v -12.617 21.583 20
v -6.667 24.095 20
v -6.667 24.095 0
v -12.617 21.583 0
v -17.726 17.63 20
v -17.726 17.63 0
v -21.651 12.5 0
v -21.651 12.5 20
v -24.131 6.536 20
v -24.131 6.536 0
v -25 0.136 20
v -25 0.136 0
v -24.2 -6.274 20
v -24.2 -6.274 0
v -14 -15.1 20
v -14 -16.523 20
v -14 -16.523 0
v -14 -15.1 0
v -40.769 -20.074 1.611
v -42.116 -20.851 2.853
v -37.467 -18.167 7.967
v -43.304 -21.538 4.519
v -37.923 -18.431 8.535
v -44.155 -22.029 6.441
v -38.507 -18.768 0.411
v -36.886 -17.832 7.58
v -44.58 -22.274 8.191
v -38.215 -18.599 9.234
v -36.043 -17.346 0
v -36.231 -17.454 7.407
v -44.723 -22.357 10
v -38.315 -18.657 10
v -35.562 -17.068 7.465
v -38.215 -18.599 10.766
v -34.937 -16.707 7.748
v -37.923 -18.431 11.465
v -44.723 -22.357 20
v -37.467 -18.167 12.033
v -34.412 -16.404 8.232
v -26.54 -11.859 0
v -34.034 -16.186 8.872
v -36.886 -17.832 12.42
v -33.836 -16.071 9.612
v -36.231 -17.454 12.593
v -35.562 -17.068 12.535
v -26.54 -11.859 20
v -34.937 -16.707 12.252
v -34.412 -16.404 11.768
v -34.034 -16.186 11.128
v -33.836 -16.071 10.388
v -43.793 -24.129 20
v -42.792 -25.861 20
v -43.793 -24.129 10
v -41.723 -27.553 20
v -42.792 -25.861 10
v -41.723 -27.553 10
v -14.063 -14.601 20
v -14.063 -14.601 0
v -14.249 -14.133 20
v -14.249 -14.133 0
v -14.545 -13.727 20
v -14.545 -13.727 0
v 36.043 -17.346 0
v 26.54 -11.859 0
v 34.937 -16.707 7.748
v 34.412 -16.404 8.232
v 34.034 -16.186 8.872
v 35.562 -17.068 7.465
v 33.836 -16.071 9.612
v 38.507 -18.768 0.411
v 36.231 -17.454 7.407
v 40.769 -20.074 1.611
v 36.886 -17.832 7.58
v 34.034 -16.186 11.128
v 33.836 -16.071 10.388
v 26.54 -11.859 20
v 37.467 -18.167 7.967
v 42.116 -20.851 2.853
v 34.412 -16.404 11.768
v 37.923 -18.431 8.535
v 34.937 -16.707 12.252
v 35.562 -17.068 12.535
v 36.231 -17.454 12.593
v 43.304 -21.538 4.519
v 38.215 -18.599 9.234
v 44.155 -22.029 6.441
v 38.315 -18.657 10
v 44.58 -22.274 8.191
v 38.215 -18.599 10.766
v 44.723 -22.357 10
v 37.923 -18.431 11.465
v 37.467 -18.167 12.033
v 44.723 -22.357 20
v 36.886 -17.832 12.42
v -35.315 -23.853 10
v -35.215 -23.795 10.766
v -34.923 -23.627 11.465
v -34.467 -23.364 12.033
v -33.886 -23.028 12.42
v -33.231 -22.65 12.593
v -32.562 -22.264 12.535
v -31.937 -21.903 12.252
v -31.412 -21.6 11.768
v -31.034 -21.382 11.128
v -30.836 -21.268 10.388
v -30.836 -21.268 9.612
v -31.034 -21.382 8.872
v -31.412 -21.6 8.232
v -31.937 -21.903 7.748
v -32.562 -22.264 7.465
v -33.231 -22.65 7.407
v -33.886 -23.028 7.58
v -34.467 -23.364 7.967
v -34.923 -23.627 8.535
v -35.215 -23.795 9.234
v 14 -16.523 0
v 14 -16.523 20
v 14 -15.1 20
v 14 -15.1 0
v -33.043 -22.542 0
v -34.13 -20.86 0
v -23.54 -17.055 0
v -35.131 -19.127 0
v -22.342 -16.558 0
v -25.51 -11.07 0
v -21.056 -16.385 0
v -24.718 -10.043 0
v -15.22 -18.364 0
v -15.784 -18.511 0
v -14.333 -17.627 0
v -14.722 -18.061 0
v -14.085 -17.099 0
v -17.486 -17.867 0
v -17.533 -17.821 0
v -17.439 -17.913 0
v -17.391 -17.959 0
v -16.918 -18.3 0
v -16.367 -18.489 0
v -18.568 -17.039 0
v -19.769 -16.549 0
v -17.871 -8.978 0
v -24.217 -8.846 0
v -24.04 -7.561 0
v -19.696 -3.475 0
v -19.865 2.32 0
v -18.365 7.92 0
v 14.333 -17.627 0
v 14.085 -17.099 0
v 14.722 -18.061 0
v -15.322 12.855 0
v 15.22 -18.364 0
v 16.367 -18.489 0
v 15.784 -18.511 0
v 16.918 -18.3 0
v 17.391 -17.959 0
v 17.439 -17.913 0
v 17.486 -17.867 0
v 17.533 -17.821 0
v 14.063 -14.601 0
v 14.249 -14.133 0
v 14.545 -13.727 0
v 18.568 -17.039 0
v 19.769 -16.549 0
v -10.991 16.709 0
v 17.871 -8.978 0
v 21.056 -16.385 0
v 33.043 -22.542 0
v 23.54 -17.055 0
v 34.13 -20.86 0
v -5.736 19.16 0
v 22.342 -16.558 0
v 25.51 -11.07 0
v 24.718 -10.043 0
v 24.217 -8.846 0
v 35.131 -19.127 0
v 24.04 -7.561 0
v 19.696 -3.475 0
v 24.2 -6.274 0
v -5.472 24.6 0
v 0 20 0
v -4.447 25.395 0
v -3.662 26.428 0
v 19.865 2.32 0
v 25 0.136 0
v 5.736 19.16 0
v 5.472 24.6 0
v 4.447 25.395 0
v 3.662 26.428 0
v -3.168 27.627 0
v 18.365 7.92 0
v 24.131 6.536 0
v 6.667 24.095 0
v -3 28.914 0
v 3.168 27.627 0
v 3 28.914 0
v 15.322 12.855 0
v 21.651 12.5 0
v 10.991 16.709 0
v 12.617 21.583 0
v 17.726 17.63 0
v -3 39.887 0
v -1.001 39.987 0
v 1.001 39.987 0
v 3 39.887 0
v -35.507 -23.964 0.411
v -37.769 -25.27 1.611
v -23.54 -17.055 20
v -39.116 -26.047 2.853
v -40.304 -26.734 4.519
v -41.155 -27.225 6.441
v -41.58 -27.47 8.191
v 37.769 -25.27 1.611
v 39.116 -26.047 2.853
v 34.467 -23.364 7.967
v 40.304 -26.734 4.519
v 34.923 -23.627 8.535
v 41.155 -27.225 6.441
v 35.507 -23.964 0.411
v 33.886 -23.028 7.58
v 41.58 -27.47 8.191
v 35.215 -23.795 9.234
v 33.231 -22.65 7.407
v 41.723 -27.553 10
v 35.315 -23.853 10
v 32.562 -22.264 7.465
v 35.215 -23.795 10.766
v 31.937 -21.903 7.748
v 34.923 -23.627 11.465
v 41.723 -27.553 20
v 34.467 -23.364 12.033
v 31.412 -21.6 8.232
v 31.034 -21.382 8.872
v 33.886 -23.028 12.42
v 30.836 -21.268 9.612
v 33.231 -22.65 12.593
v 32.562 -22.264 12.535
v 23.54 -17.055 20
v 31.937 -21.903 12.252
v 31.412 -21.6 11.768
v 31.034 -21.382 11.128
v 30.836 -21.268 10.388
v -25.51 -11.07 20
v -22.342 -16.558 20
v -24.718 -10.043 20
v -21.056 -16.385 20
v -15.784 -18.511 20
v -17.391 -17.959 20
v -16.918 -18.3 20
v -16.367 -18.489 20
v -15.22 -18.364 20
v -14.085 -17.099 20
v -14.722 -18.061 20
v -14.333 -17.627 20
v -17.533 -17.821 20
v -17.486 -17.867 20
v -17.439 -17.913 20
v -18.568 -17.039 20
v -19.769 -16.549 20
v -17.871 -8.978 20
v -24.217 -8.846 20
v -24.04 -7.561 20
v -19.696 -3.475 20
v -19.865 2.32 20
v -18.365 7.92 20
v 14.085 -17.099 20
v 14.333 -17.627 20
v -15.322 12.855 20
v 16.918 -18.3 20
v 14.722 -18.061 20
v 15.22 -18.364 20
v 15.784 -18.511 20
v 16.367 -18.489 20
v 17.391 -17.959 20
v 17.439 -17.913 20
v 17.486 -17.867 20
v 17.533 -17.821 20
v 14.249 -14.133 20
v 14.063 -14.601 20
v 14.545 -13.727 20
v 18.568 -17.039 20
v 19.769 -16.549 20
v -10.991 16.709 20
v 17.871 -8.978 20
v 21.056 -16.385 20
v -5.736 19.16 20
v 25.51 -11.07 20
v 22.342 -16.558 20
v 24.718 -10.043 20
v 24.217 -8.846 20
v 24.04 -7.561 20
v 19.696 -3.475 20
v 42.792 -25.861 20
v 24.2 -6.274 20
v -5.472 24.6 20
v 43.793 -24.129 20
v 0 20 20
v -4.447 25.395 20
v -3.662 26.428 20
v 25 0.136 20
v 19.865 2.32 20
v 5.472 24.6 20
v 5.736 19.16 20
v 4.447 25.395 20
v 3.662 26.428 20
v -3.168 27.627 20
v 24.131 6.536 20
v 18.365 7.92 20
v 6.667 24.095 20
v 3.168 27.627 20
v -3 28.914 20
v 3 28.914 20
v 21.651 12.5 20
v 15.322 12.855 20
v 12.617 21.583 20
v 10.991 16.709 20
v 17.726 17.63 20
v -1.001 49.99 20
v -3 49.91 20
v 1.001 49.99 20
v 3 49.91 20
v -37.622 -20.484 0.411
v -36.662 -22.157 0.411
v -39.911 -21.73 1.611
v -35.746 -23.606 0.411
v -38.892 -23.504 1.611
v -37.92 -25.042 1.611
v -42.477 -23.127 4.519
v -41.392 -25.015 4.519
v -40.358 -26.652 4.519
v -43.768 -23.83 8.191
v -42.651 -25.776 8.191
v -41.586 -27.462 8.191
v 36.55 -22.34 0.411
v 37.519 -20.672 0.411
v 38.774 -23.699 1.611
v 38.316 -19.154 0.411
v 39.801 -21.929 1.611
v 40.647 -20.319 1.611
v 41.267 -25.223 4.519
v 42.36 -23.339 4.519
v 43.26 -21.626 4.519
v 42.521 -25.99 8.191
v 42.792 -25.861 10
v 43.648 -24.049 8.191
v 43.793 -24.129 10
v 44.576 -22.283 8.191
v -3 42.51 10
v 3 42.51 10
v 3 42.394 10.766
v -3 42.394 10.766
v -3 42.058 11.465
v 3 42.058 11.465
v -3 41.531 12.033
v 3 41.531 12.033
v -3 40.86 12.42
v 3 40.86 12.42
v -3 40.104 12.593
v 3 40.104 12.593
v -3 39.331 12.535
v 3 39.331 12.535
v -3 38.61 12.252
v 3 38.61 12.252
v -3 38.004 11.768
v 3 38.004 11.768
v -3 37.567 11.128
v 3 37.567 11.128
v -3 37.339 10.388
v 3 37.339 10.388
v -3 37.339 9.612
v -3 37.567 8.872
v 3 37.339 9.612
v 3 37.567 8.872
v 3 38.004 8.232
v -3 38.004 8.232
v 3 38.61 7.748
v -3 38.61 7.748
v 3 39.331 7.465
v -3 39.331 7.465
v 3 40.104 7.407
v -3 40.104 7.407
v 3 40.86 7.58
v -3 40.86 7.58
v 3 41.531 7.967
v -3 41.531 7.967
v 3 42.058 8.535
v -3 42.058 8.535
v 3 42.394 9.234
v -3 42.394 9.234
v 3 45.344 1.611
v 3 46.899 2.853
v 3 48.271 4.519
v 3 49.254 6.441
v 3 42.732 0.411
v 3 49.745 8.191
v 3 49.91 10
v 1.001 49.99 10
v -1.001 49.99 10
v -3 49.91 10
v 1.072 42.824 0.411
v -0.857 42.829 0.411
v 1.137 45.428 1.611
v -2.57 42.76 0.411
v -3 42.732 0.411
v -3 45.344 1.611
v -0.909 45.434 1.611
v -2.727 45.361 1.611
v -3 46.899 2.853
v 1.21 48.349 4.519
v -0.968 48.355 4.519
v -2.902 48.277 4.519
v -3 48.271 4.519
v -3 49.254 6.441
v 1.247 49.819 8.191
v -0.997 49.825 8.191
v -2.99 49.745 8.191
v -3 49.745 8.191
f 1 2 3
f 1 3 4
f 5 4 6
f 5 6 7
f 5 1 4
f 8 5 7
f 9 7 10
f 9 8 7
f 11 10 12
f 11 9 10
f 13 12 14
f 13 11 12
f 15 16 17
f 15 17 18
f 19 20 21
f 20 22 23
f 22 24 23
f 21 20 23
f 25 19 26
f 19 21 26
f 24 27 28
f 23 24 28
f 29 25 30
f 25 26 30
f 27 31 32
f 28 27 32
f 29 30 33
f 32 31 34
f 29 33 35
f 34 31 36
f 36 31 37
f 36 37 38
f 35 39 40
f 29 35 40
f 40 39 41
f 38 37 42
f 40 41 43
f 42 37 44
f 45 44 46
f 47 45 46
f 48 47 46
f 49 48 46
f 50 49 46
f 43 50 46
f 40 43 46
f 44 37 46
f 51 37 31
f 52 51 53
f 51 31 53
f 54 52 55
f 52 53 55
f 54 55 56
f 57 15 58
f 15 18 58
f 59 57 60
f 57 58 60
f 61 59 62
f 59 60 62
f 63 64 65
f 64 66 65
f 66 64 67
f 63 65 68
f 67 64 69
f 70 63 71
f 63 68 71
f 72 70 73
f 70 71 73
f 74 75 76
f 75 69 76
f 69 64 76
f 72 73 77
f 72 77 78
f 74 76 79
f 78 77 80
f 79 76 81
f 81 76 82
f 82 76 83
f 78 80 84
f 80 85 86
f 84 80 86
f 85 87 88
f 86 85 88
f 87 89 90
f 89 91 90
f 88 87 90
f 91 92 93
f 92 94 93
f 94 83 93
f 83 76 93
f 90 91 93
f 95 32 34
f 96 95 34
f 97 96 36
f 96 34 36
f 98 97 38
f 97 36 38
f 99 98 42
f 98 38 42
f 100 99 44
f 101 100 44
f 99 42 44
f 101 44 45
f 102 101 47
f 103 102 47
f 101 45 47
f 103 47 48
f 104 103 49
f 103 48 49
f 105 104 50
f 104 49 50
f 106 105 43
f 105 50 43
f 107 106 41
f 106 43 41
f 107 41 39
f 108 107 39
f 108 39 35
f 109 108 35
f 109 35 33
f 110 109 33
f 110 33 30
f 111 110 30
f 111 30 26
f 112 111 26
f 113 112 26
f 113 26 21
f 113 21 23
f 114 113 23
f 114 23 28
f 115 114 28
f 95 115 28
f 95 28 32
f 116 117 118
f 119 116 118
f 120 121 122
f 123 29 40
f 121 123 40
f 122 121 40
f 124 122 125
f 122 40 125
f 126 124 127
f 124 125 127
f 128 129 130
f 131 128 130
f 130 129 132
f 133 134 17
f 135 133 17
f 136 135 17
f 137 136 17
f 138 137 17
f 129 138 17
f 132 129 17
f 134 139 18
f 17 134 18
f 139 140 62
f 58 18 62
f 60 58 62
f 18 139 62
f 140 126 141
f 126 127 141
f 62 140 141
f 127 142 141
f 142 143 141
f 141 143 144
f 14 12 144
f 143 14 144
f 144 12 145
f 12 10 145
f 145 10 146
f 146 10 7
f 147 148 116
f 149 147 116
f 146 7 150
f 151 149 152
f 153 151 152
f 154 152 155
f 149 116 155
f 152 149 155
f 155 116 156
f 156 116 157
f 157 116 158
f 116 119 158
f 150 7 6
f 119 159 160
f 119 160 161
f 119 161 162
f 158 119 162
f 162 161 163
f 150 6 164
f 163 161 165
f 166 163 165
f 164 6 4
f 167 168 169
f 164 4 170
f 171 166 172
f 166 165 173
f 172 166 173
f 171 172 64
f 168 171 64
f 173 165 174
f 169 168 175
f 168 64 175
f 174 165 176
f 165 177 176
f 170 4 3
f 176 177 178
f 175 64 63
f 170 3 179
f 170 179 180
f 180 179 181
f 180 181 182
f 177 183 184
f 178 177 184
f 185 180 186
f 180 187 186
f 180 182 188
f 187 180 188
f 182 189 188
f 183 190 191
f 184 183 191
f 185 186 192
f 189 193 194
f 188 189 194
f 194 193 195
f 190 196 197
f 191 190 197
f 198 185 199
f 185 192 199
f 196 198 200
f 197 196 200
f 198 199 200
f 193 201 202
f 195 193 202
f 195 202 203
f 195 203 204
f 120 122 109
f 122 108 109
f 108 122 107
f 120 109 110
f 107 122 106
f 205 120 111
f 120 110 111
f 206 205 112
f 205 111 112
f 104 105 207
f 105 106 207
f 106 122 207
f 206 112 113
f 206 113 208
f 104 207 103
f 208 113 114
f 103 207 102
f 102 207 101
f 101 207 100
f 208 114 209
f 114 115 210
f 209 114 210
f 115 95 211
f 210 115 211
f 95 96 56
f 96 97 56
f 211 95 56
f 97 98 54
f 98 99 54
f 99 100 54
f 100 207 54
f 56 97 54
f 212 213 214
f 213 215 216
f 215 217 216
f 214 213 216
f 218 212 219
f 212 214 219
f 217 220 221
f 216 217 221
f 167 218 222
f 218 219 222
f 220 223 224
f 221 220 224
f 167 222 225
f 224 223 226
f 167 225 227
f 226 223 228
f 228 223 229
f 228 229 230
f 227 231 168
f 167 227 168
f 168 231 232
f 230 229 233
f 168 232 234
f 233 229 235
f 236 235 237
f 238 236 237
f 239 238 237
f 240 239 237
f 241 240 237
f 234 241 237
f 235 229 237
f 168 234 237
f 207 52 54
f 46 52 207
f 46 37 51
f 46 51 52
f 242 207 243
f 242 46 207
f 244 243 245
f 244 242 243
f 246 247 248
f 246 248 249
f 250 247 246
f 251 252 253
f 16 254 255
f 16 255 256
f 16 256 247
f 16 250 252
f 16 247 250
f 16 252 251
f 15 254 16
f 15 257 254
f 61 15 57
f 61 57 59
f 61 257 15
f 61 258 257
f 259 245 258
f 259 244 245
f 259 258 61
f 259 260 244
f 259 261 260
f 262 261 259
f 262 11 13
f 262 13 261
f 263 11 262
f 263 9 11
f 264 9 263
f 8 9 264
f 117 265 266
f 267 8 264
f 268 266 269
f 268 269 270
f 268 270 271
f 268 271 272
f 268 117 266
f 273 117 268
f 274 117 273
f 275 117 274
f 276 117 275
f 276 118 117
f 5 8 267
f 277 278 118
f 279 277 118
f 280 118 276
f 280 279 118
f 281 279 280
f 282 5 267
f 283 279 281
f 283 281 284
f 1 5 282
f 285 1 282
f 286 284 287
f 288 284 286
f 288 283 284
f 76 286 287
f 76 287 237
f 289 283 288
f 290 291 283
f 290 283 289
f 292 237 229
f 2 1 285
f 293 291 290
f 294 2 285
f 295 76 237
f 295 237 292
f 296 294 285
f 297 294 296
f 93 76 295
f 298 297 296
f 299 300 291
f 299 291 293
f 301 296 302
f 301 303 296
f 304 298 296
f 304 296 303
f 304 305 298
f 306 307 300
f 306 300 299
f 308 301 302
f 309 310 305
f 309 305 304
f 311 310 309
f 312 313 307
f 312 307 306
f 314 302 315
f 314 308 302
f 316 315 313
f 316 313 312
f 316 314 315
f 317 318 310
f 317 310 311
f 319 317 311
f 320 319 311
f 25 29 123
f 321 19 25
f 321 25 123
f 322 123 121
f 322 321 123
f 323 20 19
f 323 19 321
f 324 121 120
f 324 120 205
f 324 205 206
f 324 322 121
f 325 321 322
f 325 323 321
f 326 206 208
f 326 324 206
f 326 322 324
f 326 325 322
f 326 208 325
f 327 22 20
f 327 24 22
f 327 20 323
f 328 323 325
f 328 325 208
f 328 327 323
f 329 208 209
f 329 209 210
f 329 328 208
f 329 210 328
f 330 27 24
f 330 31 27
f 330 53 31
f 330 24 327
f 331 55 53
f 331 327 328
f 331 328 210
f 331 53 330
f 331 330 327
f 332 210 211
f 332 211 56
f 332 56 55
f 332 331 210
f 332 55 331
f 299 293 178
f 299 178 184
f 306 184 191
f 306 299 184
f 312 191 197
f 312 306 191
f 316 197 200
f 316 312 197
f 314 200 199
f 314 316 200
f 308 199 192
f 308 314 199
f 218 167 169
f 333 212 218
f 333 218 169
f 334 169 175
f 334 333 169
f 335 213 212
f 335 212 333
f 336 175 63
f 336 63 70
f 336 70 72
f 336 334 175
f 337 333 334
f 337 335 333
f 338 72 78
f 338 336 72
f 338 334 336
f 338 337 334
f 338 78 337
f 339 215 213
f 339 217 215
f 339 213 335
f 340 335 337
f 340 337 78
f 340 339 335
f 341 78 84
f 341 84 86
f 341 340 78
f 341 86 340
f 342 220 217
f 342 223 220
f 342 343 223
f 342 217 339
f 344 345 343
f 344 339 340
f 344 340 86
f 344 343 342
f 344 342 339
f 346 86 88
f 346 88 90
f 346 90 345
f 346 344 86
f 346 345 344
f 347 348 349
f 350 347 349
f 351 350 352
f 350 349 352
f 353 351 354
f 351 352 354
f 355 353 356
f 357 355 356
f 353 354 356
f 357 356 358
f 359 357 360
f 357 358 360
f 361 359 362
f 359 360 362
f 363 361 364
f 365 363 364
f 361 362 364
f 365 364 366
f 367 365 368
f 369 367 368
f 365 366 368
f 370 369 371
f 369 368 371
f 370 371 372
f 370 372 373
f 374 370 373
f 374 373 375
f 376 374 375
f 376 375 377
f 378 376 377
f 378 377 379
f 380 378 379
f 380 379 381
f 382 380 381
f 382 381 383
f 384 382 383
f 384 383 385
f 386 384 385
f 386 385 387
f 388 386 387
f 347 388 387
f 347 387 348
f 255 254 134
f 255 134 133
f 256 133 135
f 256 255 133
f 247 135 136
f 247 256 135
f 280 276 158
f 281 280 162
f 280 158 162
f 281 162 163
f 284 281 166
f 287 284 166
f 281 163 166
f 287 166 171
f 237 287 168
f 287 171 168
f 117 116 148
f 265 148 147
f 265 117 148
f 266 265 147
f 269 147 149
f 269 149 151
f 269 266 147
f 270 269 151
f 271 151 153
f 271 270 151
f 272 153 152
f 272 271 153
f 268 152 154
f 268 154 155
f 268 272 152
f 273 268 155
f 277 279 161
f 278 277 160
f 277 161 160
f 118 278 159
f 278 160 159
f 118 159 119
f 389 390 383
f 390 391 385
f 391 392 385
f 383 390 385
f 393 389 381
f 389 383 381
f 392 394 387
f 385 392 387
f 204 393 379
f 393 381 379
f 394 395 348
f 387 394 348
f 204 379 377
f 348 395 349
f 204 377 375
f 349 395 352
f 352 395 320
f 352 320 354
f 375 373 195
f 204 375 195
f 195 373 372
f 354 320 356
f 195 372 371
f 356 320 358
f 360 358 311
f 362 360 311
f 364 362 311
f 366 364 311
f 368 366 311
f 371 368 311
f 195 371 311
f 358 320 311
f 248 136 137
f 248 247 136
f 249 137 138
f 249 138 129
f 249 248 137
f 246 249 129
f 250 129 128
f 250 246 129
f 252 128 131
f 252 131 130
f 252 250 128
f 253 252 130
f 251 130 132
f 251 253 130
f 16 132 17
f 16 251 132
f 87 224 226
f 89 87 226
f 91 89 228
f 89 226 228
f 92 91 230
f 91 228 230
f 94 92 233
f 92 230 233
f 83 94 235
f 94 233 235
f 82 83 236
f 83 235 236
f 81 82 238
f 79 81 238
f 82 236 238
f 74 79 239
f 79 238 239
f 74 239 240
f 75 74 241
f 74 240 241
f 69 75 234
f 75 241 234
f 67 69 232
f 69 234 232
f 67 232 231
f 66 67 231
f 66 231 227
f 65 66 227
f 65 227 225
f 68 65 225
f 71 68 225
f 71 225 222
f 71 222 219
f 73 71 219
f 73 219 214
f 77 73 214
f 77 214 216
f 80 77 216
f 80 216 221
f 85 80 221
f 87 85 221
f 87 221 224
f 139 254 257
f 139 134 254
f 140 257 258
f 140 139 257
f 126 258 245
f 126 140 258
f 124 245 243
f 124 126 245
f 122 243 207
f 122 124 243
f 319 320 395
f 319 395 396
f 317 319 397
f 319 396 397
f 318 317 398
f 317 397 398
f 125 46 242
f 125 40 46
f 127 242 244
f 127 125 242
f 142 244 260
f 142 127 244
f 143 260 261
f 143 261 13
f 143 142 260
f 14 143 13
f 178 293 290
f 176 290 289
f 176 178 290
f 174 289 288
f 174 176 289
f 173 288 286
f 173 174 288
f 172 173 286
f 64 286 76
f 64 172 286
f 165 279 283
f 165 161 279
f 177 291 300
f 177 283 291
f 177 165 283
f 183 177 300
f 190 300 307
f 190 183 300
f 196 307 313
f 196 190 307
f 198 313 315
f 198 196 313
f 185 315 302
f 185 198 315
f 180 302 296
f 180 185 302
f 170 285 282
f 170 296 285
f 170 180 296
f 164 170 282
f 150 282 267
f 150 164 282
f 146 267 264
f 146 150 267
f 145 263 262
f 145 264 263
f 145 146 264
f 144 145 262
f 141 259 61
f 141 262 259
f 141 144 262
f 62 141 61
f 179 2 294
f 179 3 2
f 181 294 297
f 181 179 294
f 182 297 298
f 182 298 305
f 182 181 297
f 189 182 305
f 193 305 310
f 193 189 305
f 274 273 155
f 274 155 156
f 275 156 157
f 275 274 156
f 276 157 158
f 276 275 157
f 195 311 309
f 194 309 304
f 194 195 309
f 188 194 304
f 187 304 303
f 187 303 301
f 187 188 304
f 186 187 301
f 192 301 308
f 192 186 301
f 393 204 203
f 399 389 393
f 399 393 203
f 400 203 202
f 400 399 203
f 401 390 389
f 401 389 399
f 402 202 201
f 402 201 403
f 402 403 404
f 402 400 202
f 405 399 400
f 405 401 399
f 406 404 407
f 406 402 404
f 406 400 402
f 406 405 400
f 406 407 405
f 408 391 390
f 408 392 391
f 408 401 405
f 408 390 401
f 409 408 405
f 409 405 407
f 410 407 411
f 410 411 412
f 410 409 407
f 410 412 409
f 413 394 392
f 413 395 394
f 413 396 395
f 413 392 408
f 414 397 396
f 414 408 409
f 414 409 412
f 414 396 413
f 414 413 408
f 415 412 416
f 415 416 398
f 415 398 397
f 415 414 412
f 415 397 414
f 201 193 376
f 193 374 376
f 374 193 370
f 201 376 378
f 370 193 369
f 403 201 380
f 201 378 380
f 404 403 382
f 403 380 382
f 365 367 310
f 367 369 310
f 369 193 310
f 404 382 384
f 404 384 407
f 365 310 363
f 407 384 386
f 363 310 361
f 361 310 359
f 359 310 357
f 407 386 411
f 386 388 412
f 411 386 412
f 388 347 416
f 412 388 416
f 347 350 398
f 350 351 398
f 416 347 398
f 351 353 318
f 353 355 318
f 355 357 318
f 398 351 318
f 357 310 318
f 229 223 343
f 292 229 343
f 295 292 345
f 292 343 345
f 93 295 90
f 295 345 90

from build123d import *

# Parameters (mm, degrees)
SKETCH_R              = 50
SKETCH_R_2            = 20
PAD_DEPTH             = 20
POCKET_DEPTH          = 305.658137
POLARPATTERN_COUNT    = 3
SKETCH002_W           = 28
SKETCH002_H           = 22.742476
POCKET001_DEPTH       = 20.001
SKETCH003_R           = 2.6
POCKET002_DEPTH       = 287.850495
POLARPATTERN001_COUNT = 3
FILLET_R              = 2
FILLET001_R           = 5
FILLET002_R           = 10


with BuildPart() as part:
    # Sketch → Pad (new body)
    with BuildSketch(Plane.XY):
        Circle(SKETCH_R)
        Circle(SKETCH_R_2, mode=Mode.SUBTRACT)
    extrude(amount=PAD_DEPTH)

    # Sketch001 (on Face4 of Pad) → Pocket (cut, through all)
    with BuildSketch(Plane.XY.offset(20)):
        with BuildLine():
            ThreePointArc((22.994185, -9.811597), (21.650635, 12.5), (3, 24.819347))
            Line((3, 55.952225), (3, 24.819347))
            ThreePointArc((49.956048, -25.378036), (48.525649, 28.016297), (3, 55.952225))
            Line((22.994185, -9.811597), (49.956048, -25.378036))
        make_face()
    pocket = extrude(amount=-POCKET_DEPTH, mode=Mode.SUBTRACT)

    # PolarPattern: Pocket ×3 about axis
    polarpattern_axis = Axis((0, 0, 20), (0, 0, 1))
    for i in range(1, POLARPATTERN_COUNT):
        add(pocket.rotate(polarpattern_axis, i * 360 / POLARPATTERN_COUNT), mode=Mode.SUBTRACT)

    # Sketch002 (on Face4 of PolarPattern) → Pocket001 (cut, through all)
    with BuildSketch(Plane.XY.offset(20)):
        with Locations((0, -23.477223)):
            Rectangle(SKETCH002_W, SKETCH002_H)
    extrude(amount=-POCKET001_DEPTH, mode=Mode.SUBTRACT)

    # Sketch003 (on Face5 of Pocket001) → Pocket002 (cut, through all)
    with BuildSketch(Plane.YZ.offset(3)):
        with Locations((39.909919, 10)):
            Circle(SKETCH003_R)
    pocket002 = extrude(amount=-POCKET002_DEPTH, mode=Mode.SUBTRACT)

    # PolarPattern001: Pocket002 ×3 about axis
    polarpattern001_axis = Axis((0, 0, 0), (0, 0, 1))
    for i in range(1, POLARPATTERN001_COUNT):
        add(pocket002.rotate(polarpattern001_axis, i * 360 / POLARPATTERN001_COUNT), mode=Mode.SUBTRACT)

    # Fillet
    fillet_edges = [part.edges().sort_by_distance(p)[0] for p in [
        (-14, -20.712315, 10),
        (14, -20.712315, 10),
        (14, -14.282857, 10),
        (-14, -14.282857, 10),
    ]]
    fillet(fillet_edges, radius=FILLET_R)

    # Fillet001
    fillet001_edges = [part.edges().sort_by_distance(p)[0] for p in [
        (3, 24.819347, 10),
        (22.994185, -9.811597, 10),
        (-3, 24.819347, 10),
        (-22.994185, -9.811597, 10),
        (-19.994185, -15.00775, 10),
        (19.994185, -15.00775, 10),
    ]]
    fillet(fillet001_edges, radius=FILLET001_R)

    # Fillet002
    fillet002_edges = [part.edges().sort_by_distance(p)[0] for p in [
        (43.30127, -25, 0),
        (-43.30127, -25, 0),
        (0, 50, 0),
    ]]
    fillet(fillet002_edges, radius=FILLET002_R)


solid = part.part
